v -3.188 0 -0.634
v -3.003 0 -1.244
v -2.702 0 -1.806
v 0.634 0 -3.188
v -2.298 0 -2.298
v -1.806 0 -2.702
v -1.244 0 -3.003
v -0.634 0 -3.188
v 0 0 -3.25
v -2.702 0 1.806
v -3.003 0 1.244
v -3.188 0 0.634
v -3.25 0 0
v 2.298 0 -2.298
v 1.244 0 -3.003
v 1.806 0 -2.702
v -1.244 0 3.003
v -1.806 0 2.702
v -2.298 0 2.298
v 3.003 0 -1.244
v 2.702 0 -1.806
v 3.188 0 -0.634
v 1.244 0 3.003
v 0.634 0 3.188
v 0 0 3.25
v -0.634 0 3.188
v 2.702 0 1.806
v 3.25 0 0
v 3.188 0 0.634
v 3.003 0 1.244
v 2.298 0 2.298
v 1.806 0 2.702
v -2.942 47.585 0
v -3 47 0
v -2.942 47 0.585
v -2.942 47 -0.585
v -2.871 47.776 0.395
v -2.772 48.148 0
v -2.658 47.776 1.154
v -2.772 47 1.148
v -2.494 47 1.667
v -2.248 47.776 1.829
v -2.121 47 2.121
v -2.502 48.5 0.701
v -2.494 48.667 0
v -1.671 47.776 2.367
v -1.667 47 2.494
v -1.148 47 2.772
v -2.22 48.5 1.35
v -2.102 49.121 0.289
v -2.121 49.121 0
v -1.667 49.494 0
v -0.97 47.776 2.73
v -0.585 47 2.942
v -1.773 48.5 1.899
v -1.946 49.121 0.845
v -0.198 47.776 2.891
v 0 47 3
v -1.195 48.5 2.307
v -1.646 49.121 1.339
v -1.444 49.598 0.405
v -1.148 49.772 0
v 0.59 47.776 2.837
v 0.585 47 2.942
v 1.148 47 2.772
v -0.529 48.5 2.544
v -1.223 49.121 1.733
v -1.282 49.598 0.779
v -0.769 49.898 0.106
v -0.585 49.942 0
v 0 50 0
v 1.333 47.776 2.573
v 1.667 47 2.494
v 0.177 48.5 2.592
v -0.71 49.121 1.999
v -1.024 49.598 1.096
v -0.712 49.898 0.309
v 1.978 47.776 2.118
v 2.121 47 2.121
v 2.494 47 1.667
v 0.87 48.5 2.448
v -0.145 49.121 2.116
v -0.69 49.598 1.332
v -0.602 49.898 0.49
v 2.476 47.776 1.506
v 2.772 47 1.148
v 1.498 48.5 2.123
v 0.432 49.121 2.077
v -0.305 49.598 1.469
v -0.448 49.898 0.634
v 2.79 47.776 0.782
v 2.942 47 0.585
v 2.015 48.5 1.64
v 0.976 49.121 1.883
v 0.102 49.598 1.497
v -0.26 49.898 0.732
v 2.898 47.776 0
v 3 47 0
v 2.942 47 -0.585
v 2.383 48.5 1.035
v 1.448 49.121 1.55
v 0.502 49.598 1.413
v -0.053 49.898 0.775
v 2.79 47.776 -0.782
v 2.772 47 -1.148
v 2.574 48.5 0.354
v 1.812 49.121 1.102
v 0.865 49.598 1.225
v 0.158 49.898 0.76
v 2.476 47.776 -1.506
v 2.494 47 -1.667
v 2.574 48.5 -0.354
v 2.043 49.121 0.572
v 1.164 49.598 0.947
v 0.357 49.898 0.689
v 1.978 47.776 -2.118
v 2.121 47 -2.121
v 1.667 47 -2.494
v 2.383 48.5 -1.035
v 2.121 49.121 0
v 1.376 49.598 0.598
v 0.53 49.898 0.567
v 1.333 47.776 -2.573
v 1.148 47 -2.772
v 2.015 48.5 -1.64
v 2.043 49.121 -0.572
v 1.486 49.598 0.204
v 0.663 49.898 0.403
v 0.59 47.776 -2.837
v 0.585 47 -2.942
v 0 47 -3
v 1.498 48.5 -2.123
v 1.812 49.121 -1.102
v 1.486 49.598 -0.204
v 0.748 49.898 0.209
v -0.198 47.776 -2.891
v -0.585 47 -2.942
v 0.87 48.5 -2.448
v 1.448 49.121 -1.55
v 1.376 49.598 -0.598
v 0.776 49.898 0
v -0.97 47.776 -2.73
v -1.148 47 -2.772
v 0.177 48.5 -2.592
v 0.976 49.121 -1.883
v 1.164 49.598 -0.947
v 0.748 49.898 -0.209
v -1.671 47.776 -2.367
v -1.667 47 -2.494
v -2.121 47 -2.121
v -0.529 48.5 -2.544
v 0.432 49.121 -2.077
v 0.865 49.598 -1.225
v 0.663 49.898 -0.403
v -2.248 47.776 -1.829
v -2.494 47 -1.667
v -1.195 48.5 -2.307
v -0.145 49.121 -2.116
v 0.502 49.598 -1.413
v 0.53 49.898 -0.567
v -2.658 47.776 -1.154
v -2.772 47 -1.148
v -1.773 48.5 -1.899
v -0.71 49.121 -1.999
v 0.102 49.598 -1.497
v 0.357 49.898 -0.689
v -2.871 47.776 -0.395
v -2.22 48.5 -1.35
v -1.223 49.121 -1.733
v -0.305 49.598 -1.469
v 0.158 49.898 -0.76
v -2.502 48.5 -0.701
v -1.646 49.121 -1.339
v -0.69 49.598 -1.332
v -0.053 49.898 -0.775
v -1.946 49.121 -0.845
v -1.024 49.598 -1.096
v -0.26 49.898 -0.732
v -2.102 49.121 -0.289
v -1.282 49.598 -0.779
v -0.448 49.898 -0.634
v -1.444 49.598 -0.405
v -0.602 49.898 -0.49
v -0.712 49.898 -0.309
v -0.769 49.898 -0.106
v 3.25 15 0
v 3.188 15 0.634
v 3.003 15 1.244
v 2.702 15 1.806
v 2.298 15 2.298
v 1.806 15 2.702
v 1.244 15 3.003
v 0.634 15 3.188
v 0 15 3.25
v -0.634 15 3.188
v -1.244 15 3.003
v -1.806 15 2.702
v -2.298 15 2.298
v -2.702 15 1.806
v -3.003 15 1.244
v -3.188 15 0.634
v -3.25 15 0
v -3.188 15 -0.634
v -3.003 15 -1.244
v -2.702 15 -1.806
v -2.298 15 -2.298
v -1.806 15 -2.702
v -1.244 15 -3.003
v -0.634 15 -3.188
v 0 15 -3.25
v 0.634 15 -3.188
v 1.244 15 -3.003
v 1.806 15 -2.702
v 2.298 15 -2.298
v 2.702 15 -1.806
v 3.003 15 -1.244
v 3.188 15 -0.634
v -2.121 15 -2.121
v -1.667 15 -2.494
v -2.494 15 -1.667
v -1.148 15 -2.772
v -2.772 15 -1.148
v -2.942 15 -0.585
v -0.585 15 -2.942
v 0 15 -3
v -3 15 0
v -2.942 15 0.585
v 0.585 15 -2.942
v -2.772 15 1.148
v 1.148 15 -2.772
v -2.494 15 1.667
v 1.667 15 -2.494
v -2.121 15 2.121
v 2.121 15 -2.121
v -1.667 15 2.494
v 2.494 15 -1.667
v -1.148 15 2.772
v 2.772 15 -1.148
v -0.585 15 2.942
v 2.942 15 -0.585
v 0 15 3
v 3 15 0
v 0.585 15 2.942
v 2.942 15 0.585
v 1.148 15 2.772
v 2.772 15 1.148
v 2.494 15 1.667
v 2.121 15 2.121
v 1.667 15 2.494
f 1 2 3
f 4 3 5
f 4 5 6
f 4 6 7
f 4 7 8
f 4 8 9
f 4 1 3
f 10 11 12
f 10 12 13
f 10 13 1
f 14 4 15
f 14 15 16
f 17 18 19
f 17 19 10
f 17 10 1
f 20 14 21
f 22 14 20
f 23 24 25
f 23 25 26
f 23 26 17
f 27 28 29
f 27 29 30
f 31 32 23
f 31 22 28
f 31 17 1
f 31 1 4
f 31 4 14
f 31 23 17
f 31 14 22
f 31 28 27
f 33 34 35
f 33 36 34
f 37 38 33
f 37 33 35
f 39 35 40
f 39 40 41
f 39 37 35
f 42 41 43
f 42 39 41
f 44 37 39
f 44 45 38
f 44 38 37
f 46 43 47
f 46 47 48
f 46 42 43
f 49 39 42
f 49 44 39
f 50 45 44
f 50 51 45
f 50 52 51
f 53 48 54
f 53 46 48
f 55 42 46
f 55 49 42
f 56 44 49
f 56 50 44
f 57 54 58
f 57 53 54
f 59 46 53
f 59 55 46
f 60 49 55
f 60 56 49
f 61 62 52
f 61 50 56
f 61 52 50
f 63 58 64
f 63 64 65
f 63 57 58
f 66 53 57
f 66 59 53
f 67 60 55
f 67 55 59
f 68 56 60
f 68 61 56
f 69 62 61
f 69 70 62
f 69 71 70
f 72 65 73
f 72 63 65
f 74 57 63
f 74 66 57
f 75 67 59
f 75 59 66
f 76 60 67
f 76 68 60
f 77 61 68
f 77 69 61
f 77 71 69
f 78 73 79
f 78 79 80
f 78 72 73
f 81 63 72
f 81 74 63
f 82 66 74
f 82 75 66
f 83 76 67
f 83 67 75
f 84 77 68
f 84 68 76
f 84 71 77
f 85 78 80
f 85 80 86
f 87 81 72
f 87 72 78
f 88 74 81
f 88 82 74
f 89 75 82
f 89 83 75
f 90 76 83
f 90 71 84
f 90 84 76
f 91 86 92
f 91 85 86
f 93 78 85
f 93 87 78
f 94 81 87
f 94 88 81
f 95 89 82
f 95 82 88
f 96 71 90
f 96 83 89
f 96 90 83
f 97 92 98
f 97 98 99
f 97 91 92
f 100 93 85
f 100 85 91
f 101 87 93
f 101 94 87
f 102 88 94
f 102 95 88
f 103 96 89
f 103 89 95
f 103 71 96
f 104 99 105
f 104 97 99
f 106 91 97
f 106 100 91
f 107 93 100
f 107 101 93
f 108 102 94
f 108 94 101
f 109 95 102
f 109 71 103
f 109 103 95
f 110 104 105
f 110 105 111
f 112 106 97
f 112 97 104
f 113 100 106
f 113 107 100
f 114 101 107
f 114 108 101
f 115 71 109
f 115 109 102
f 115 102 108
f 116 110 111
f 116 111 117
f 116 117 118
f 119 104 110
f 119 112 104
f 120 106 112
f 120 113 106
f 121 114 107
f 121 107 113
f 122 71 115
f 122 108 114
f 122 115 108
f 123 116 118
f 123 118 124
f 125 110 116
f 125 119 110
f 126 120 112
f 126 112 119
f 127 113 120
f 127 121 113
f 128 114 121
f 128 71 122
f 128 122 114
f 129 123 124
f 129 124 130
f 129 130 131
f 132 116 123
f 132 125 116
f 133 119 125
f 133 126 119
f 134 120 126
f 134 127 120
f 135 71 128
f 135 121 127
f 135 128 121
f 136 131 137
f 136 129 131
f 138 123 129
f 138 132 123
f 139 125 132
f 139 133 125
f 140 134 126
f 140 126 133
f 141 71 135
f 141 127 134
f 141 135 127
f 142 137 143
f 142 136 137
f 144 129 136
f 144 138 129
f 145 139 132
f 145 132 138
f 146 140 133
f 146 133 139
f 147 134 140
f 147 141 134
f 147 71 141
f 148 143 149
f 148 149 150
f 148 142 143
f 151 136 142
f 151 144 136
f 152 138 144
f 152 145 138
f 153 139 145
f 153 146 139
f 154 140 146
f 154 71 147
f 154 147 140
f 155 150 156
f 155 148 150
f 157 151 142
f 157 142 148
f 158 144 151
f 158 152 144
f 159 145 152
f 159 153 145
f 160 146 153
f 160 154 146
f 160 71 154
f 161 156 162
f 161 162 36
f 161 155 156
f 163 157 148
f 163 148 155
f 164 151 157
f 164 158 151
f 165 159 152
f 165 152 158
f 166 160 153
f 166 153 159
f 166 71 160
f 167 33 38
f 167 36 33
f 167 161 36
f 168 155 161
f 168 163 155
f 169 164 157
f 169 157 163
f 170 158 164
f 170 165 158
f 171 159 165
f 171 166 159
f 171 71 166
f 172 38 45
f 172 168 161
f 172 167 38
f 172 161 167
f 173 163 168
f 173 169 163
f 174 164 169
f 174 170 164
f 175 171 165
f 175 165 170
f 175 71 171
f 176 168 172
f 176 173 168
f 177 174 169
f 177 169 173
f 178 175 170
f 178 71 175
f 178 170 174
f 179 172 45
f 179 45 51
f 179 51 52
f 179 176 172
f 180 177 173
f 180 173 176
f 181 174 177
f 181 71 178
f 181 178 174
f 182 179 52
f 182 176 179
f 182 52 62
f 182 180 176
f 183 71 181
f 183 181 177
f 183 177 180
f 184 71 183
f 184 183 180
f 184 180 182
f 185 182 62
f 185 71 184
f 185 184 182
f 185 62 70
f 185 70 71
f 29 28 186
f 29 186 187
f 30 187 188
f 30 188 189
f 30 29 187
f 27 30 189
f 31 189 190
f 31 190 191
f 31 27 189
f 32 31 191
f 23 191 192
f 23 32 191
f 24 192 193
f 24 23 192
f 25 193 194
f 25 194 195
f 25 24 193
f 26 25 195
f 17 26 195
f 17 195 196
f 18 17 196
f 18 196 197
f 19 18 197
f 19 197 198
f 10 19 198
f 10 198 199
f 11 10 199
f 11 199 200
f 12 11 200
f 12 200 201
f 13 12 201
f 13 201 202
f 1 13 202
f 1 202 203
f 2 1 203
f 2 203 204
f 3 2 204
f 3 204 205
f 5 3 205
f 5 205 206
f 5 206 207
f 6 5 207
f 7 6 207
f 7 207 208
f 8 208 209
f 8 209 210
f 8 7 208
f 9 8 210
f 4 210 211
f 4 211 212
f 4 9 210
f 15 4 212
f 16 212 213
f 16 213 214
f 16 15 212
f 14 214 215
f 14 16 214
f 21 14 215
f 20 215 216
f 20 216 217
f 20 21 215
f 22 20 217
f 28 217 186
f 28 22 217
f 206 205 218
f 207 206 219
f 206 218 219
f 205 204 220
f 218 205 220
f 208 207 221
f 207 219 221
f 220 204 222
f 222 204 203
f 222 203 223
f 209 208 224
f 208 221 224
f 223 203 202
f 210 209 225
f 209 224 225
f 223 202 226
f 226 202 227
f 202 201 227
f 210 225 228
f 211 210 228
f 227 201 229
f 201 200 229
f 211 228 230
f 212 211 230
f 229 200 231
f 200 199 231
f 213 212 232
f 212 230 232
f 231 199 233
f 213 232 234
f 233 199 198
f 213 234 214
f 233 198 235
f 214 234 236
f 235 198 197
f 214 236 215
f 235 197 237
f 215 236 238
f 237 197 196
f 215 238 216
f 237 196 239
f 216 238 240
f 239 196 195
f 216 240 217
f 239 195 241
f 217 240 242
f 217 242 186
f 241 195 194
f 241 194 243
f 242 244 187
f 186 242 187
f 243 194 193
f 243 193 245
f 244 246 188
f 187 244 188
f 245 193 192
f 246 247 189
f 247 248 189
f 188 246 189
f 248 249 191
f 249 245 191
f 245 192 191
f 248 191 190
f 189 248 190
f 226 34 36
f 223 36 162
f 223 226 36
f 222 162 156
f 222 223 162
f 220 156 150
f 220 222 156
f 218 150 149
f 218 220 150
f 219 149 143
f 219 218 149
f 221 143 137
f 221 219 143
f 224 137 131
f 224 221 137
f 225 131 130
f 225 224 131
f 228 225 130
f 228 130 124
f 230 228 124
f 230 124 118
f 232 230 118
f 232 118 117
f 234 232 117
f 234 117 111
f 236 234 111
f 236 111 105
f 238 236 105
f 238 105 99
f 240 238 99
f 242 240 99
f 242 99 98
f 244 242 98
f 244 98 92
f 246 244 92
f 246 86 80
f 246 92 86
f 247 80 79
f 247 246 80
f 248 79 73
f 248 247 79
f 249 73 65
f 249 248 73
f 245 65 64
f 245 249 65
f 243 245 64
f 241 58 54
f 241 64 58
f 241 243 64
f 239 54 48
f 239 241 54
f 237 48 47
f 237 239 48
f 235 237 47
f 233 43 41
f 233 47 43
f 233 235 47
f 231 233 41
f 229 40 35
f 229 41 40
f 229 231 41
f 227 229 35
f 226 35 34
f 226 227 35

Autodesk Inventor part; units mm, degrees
ref_plane "YZ Plane" through (0, 0, 0) normal (1, 0, 0) x (0, 1, 0)
ref_plane "XZ Plane" through (0, 0, 0) normal (0, 1, 0) x (-1, 0, 0)
ref_plane "XY Plane" through (0, 0, 0) normal (0, 0, 1) x (1, 0, 0)
sketch "Sketch1" plane through (0, 0, 0) normal (0, 1, 0) x (-1, 0, 0)
  circle A0 centre (0, 0) radius 3
  dimension "d0" = 6
extrude "Extrusion1" add sketch "Sketch1" along normal blind 50
fillet "Fillet1" radius 3 1 edges at (3, 50, 0)
sketch "Sketch2" plane through (0, 0, 0) normal (0, -1, 0) x (1, 0, 0)
  circle A0 centre (0, 0) radius 3.25
  dimension "d4" = 6.5
extrude "Extrusion2" add sketch "Sketch2" against normal blind 15
properties part number "Temp Water Sensor"
